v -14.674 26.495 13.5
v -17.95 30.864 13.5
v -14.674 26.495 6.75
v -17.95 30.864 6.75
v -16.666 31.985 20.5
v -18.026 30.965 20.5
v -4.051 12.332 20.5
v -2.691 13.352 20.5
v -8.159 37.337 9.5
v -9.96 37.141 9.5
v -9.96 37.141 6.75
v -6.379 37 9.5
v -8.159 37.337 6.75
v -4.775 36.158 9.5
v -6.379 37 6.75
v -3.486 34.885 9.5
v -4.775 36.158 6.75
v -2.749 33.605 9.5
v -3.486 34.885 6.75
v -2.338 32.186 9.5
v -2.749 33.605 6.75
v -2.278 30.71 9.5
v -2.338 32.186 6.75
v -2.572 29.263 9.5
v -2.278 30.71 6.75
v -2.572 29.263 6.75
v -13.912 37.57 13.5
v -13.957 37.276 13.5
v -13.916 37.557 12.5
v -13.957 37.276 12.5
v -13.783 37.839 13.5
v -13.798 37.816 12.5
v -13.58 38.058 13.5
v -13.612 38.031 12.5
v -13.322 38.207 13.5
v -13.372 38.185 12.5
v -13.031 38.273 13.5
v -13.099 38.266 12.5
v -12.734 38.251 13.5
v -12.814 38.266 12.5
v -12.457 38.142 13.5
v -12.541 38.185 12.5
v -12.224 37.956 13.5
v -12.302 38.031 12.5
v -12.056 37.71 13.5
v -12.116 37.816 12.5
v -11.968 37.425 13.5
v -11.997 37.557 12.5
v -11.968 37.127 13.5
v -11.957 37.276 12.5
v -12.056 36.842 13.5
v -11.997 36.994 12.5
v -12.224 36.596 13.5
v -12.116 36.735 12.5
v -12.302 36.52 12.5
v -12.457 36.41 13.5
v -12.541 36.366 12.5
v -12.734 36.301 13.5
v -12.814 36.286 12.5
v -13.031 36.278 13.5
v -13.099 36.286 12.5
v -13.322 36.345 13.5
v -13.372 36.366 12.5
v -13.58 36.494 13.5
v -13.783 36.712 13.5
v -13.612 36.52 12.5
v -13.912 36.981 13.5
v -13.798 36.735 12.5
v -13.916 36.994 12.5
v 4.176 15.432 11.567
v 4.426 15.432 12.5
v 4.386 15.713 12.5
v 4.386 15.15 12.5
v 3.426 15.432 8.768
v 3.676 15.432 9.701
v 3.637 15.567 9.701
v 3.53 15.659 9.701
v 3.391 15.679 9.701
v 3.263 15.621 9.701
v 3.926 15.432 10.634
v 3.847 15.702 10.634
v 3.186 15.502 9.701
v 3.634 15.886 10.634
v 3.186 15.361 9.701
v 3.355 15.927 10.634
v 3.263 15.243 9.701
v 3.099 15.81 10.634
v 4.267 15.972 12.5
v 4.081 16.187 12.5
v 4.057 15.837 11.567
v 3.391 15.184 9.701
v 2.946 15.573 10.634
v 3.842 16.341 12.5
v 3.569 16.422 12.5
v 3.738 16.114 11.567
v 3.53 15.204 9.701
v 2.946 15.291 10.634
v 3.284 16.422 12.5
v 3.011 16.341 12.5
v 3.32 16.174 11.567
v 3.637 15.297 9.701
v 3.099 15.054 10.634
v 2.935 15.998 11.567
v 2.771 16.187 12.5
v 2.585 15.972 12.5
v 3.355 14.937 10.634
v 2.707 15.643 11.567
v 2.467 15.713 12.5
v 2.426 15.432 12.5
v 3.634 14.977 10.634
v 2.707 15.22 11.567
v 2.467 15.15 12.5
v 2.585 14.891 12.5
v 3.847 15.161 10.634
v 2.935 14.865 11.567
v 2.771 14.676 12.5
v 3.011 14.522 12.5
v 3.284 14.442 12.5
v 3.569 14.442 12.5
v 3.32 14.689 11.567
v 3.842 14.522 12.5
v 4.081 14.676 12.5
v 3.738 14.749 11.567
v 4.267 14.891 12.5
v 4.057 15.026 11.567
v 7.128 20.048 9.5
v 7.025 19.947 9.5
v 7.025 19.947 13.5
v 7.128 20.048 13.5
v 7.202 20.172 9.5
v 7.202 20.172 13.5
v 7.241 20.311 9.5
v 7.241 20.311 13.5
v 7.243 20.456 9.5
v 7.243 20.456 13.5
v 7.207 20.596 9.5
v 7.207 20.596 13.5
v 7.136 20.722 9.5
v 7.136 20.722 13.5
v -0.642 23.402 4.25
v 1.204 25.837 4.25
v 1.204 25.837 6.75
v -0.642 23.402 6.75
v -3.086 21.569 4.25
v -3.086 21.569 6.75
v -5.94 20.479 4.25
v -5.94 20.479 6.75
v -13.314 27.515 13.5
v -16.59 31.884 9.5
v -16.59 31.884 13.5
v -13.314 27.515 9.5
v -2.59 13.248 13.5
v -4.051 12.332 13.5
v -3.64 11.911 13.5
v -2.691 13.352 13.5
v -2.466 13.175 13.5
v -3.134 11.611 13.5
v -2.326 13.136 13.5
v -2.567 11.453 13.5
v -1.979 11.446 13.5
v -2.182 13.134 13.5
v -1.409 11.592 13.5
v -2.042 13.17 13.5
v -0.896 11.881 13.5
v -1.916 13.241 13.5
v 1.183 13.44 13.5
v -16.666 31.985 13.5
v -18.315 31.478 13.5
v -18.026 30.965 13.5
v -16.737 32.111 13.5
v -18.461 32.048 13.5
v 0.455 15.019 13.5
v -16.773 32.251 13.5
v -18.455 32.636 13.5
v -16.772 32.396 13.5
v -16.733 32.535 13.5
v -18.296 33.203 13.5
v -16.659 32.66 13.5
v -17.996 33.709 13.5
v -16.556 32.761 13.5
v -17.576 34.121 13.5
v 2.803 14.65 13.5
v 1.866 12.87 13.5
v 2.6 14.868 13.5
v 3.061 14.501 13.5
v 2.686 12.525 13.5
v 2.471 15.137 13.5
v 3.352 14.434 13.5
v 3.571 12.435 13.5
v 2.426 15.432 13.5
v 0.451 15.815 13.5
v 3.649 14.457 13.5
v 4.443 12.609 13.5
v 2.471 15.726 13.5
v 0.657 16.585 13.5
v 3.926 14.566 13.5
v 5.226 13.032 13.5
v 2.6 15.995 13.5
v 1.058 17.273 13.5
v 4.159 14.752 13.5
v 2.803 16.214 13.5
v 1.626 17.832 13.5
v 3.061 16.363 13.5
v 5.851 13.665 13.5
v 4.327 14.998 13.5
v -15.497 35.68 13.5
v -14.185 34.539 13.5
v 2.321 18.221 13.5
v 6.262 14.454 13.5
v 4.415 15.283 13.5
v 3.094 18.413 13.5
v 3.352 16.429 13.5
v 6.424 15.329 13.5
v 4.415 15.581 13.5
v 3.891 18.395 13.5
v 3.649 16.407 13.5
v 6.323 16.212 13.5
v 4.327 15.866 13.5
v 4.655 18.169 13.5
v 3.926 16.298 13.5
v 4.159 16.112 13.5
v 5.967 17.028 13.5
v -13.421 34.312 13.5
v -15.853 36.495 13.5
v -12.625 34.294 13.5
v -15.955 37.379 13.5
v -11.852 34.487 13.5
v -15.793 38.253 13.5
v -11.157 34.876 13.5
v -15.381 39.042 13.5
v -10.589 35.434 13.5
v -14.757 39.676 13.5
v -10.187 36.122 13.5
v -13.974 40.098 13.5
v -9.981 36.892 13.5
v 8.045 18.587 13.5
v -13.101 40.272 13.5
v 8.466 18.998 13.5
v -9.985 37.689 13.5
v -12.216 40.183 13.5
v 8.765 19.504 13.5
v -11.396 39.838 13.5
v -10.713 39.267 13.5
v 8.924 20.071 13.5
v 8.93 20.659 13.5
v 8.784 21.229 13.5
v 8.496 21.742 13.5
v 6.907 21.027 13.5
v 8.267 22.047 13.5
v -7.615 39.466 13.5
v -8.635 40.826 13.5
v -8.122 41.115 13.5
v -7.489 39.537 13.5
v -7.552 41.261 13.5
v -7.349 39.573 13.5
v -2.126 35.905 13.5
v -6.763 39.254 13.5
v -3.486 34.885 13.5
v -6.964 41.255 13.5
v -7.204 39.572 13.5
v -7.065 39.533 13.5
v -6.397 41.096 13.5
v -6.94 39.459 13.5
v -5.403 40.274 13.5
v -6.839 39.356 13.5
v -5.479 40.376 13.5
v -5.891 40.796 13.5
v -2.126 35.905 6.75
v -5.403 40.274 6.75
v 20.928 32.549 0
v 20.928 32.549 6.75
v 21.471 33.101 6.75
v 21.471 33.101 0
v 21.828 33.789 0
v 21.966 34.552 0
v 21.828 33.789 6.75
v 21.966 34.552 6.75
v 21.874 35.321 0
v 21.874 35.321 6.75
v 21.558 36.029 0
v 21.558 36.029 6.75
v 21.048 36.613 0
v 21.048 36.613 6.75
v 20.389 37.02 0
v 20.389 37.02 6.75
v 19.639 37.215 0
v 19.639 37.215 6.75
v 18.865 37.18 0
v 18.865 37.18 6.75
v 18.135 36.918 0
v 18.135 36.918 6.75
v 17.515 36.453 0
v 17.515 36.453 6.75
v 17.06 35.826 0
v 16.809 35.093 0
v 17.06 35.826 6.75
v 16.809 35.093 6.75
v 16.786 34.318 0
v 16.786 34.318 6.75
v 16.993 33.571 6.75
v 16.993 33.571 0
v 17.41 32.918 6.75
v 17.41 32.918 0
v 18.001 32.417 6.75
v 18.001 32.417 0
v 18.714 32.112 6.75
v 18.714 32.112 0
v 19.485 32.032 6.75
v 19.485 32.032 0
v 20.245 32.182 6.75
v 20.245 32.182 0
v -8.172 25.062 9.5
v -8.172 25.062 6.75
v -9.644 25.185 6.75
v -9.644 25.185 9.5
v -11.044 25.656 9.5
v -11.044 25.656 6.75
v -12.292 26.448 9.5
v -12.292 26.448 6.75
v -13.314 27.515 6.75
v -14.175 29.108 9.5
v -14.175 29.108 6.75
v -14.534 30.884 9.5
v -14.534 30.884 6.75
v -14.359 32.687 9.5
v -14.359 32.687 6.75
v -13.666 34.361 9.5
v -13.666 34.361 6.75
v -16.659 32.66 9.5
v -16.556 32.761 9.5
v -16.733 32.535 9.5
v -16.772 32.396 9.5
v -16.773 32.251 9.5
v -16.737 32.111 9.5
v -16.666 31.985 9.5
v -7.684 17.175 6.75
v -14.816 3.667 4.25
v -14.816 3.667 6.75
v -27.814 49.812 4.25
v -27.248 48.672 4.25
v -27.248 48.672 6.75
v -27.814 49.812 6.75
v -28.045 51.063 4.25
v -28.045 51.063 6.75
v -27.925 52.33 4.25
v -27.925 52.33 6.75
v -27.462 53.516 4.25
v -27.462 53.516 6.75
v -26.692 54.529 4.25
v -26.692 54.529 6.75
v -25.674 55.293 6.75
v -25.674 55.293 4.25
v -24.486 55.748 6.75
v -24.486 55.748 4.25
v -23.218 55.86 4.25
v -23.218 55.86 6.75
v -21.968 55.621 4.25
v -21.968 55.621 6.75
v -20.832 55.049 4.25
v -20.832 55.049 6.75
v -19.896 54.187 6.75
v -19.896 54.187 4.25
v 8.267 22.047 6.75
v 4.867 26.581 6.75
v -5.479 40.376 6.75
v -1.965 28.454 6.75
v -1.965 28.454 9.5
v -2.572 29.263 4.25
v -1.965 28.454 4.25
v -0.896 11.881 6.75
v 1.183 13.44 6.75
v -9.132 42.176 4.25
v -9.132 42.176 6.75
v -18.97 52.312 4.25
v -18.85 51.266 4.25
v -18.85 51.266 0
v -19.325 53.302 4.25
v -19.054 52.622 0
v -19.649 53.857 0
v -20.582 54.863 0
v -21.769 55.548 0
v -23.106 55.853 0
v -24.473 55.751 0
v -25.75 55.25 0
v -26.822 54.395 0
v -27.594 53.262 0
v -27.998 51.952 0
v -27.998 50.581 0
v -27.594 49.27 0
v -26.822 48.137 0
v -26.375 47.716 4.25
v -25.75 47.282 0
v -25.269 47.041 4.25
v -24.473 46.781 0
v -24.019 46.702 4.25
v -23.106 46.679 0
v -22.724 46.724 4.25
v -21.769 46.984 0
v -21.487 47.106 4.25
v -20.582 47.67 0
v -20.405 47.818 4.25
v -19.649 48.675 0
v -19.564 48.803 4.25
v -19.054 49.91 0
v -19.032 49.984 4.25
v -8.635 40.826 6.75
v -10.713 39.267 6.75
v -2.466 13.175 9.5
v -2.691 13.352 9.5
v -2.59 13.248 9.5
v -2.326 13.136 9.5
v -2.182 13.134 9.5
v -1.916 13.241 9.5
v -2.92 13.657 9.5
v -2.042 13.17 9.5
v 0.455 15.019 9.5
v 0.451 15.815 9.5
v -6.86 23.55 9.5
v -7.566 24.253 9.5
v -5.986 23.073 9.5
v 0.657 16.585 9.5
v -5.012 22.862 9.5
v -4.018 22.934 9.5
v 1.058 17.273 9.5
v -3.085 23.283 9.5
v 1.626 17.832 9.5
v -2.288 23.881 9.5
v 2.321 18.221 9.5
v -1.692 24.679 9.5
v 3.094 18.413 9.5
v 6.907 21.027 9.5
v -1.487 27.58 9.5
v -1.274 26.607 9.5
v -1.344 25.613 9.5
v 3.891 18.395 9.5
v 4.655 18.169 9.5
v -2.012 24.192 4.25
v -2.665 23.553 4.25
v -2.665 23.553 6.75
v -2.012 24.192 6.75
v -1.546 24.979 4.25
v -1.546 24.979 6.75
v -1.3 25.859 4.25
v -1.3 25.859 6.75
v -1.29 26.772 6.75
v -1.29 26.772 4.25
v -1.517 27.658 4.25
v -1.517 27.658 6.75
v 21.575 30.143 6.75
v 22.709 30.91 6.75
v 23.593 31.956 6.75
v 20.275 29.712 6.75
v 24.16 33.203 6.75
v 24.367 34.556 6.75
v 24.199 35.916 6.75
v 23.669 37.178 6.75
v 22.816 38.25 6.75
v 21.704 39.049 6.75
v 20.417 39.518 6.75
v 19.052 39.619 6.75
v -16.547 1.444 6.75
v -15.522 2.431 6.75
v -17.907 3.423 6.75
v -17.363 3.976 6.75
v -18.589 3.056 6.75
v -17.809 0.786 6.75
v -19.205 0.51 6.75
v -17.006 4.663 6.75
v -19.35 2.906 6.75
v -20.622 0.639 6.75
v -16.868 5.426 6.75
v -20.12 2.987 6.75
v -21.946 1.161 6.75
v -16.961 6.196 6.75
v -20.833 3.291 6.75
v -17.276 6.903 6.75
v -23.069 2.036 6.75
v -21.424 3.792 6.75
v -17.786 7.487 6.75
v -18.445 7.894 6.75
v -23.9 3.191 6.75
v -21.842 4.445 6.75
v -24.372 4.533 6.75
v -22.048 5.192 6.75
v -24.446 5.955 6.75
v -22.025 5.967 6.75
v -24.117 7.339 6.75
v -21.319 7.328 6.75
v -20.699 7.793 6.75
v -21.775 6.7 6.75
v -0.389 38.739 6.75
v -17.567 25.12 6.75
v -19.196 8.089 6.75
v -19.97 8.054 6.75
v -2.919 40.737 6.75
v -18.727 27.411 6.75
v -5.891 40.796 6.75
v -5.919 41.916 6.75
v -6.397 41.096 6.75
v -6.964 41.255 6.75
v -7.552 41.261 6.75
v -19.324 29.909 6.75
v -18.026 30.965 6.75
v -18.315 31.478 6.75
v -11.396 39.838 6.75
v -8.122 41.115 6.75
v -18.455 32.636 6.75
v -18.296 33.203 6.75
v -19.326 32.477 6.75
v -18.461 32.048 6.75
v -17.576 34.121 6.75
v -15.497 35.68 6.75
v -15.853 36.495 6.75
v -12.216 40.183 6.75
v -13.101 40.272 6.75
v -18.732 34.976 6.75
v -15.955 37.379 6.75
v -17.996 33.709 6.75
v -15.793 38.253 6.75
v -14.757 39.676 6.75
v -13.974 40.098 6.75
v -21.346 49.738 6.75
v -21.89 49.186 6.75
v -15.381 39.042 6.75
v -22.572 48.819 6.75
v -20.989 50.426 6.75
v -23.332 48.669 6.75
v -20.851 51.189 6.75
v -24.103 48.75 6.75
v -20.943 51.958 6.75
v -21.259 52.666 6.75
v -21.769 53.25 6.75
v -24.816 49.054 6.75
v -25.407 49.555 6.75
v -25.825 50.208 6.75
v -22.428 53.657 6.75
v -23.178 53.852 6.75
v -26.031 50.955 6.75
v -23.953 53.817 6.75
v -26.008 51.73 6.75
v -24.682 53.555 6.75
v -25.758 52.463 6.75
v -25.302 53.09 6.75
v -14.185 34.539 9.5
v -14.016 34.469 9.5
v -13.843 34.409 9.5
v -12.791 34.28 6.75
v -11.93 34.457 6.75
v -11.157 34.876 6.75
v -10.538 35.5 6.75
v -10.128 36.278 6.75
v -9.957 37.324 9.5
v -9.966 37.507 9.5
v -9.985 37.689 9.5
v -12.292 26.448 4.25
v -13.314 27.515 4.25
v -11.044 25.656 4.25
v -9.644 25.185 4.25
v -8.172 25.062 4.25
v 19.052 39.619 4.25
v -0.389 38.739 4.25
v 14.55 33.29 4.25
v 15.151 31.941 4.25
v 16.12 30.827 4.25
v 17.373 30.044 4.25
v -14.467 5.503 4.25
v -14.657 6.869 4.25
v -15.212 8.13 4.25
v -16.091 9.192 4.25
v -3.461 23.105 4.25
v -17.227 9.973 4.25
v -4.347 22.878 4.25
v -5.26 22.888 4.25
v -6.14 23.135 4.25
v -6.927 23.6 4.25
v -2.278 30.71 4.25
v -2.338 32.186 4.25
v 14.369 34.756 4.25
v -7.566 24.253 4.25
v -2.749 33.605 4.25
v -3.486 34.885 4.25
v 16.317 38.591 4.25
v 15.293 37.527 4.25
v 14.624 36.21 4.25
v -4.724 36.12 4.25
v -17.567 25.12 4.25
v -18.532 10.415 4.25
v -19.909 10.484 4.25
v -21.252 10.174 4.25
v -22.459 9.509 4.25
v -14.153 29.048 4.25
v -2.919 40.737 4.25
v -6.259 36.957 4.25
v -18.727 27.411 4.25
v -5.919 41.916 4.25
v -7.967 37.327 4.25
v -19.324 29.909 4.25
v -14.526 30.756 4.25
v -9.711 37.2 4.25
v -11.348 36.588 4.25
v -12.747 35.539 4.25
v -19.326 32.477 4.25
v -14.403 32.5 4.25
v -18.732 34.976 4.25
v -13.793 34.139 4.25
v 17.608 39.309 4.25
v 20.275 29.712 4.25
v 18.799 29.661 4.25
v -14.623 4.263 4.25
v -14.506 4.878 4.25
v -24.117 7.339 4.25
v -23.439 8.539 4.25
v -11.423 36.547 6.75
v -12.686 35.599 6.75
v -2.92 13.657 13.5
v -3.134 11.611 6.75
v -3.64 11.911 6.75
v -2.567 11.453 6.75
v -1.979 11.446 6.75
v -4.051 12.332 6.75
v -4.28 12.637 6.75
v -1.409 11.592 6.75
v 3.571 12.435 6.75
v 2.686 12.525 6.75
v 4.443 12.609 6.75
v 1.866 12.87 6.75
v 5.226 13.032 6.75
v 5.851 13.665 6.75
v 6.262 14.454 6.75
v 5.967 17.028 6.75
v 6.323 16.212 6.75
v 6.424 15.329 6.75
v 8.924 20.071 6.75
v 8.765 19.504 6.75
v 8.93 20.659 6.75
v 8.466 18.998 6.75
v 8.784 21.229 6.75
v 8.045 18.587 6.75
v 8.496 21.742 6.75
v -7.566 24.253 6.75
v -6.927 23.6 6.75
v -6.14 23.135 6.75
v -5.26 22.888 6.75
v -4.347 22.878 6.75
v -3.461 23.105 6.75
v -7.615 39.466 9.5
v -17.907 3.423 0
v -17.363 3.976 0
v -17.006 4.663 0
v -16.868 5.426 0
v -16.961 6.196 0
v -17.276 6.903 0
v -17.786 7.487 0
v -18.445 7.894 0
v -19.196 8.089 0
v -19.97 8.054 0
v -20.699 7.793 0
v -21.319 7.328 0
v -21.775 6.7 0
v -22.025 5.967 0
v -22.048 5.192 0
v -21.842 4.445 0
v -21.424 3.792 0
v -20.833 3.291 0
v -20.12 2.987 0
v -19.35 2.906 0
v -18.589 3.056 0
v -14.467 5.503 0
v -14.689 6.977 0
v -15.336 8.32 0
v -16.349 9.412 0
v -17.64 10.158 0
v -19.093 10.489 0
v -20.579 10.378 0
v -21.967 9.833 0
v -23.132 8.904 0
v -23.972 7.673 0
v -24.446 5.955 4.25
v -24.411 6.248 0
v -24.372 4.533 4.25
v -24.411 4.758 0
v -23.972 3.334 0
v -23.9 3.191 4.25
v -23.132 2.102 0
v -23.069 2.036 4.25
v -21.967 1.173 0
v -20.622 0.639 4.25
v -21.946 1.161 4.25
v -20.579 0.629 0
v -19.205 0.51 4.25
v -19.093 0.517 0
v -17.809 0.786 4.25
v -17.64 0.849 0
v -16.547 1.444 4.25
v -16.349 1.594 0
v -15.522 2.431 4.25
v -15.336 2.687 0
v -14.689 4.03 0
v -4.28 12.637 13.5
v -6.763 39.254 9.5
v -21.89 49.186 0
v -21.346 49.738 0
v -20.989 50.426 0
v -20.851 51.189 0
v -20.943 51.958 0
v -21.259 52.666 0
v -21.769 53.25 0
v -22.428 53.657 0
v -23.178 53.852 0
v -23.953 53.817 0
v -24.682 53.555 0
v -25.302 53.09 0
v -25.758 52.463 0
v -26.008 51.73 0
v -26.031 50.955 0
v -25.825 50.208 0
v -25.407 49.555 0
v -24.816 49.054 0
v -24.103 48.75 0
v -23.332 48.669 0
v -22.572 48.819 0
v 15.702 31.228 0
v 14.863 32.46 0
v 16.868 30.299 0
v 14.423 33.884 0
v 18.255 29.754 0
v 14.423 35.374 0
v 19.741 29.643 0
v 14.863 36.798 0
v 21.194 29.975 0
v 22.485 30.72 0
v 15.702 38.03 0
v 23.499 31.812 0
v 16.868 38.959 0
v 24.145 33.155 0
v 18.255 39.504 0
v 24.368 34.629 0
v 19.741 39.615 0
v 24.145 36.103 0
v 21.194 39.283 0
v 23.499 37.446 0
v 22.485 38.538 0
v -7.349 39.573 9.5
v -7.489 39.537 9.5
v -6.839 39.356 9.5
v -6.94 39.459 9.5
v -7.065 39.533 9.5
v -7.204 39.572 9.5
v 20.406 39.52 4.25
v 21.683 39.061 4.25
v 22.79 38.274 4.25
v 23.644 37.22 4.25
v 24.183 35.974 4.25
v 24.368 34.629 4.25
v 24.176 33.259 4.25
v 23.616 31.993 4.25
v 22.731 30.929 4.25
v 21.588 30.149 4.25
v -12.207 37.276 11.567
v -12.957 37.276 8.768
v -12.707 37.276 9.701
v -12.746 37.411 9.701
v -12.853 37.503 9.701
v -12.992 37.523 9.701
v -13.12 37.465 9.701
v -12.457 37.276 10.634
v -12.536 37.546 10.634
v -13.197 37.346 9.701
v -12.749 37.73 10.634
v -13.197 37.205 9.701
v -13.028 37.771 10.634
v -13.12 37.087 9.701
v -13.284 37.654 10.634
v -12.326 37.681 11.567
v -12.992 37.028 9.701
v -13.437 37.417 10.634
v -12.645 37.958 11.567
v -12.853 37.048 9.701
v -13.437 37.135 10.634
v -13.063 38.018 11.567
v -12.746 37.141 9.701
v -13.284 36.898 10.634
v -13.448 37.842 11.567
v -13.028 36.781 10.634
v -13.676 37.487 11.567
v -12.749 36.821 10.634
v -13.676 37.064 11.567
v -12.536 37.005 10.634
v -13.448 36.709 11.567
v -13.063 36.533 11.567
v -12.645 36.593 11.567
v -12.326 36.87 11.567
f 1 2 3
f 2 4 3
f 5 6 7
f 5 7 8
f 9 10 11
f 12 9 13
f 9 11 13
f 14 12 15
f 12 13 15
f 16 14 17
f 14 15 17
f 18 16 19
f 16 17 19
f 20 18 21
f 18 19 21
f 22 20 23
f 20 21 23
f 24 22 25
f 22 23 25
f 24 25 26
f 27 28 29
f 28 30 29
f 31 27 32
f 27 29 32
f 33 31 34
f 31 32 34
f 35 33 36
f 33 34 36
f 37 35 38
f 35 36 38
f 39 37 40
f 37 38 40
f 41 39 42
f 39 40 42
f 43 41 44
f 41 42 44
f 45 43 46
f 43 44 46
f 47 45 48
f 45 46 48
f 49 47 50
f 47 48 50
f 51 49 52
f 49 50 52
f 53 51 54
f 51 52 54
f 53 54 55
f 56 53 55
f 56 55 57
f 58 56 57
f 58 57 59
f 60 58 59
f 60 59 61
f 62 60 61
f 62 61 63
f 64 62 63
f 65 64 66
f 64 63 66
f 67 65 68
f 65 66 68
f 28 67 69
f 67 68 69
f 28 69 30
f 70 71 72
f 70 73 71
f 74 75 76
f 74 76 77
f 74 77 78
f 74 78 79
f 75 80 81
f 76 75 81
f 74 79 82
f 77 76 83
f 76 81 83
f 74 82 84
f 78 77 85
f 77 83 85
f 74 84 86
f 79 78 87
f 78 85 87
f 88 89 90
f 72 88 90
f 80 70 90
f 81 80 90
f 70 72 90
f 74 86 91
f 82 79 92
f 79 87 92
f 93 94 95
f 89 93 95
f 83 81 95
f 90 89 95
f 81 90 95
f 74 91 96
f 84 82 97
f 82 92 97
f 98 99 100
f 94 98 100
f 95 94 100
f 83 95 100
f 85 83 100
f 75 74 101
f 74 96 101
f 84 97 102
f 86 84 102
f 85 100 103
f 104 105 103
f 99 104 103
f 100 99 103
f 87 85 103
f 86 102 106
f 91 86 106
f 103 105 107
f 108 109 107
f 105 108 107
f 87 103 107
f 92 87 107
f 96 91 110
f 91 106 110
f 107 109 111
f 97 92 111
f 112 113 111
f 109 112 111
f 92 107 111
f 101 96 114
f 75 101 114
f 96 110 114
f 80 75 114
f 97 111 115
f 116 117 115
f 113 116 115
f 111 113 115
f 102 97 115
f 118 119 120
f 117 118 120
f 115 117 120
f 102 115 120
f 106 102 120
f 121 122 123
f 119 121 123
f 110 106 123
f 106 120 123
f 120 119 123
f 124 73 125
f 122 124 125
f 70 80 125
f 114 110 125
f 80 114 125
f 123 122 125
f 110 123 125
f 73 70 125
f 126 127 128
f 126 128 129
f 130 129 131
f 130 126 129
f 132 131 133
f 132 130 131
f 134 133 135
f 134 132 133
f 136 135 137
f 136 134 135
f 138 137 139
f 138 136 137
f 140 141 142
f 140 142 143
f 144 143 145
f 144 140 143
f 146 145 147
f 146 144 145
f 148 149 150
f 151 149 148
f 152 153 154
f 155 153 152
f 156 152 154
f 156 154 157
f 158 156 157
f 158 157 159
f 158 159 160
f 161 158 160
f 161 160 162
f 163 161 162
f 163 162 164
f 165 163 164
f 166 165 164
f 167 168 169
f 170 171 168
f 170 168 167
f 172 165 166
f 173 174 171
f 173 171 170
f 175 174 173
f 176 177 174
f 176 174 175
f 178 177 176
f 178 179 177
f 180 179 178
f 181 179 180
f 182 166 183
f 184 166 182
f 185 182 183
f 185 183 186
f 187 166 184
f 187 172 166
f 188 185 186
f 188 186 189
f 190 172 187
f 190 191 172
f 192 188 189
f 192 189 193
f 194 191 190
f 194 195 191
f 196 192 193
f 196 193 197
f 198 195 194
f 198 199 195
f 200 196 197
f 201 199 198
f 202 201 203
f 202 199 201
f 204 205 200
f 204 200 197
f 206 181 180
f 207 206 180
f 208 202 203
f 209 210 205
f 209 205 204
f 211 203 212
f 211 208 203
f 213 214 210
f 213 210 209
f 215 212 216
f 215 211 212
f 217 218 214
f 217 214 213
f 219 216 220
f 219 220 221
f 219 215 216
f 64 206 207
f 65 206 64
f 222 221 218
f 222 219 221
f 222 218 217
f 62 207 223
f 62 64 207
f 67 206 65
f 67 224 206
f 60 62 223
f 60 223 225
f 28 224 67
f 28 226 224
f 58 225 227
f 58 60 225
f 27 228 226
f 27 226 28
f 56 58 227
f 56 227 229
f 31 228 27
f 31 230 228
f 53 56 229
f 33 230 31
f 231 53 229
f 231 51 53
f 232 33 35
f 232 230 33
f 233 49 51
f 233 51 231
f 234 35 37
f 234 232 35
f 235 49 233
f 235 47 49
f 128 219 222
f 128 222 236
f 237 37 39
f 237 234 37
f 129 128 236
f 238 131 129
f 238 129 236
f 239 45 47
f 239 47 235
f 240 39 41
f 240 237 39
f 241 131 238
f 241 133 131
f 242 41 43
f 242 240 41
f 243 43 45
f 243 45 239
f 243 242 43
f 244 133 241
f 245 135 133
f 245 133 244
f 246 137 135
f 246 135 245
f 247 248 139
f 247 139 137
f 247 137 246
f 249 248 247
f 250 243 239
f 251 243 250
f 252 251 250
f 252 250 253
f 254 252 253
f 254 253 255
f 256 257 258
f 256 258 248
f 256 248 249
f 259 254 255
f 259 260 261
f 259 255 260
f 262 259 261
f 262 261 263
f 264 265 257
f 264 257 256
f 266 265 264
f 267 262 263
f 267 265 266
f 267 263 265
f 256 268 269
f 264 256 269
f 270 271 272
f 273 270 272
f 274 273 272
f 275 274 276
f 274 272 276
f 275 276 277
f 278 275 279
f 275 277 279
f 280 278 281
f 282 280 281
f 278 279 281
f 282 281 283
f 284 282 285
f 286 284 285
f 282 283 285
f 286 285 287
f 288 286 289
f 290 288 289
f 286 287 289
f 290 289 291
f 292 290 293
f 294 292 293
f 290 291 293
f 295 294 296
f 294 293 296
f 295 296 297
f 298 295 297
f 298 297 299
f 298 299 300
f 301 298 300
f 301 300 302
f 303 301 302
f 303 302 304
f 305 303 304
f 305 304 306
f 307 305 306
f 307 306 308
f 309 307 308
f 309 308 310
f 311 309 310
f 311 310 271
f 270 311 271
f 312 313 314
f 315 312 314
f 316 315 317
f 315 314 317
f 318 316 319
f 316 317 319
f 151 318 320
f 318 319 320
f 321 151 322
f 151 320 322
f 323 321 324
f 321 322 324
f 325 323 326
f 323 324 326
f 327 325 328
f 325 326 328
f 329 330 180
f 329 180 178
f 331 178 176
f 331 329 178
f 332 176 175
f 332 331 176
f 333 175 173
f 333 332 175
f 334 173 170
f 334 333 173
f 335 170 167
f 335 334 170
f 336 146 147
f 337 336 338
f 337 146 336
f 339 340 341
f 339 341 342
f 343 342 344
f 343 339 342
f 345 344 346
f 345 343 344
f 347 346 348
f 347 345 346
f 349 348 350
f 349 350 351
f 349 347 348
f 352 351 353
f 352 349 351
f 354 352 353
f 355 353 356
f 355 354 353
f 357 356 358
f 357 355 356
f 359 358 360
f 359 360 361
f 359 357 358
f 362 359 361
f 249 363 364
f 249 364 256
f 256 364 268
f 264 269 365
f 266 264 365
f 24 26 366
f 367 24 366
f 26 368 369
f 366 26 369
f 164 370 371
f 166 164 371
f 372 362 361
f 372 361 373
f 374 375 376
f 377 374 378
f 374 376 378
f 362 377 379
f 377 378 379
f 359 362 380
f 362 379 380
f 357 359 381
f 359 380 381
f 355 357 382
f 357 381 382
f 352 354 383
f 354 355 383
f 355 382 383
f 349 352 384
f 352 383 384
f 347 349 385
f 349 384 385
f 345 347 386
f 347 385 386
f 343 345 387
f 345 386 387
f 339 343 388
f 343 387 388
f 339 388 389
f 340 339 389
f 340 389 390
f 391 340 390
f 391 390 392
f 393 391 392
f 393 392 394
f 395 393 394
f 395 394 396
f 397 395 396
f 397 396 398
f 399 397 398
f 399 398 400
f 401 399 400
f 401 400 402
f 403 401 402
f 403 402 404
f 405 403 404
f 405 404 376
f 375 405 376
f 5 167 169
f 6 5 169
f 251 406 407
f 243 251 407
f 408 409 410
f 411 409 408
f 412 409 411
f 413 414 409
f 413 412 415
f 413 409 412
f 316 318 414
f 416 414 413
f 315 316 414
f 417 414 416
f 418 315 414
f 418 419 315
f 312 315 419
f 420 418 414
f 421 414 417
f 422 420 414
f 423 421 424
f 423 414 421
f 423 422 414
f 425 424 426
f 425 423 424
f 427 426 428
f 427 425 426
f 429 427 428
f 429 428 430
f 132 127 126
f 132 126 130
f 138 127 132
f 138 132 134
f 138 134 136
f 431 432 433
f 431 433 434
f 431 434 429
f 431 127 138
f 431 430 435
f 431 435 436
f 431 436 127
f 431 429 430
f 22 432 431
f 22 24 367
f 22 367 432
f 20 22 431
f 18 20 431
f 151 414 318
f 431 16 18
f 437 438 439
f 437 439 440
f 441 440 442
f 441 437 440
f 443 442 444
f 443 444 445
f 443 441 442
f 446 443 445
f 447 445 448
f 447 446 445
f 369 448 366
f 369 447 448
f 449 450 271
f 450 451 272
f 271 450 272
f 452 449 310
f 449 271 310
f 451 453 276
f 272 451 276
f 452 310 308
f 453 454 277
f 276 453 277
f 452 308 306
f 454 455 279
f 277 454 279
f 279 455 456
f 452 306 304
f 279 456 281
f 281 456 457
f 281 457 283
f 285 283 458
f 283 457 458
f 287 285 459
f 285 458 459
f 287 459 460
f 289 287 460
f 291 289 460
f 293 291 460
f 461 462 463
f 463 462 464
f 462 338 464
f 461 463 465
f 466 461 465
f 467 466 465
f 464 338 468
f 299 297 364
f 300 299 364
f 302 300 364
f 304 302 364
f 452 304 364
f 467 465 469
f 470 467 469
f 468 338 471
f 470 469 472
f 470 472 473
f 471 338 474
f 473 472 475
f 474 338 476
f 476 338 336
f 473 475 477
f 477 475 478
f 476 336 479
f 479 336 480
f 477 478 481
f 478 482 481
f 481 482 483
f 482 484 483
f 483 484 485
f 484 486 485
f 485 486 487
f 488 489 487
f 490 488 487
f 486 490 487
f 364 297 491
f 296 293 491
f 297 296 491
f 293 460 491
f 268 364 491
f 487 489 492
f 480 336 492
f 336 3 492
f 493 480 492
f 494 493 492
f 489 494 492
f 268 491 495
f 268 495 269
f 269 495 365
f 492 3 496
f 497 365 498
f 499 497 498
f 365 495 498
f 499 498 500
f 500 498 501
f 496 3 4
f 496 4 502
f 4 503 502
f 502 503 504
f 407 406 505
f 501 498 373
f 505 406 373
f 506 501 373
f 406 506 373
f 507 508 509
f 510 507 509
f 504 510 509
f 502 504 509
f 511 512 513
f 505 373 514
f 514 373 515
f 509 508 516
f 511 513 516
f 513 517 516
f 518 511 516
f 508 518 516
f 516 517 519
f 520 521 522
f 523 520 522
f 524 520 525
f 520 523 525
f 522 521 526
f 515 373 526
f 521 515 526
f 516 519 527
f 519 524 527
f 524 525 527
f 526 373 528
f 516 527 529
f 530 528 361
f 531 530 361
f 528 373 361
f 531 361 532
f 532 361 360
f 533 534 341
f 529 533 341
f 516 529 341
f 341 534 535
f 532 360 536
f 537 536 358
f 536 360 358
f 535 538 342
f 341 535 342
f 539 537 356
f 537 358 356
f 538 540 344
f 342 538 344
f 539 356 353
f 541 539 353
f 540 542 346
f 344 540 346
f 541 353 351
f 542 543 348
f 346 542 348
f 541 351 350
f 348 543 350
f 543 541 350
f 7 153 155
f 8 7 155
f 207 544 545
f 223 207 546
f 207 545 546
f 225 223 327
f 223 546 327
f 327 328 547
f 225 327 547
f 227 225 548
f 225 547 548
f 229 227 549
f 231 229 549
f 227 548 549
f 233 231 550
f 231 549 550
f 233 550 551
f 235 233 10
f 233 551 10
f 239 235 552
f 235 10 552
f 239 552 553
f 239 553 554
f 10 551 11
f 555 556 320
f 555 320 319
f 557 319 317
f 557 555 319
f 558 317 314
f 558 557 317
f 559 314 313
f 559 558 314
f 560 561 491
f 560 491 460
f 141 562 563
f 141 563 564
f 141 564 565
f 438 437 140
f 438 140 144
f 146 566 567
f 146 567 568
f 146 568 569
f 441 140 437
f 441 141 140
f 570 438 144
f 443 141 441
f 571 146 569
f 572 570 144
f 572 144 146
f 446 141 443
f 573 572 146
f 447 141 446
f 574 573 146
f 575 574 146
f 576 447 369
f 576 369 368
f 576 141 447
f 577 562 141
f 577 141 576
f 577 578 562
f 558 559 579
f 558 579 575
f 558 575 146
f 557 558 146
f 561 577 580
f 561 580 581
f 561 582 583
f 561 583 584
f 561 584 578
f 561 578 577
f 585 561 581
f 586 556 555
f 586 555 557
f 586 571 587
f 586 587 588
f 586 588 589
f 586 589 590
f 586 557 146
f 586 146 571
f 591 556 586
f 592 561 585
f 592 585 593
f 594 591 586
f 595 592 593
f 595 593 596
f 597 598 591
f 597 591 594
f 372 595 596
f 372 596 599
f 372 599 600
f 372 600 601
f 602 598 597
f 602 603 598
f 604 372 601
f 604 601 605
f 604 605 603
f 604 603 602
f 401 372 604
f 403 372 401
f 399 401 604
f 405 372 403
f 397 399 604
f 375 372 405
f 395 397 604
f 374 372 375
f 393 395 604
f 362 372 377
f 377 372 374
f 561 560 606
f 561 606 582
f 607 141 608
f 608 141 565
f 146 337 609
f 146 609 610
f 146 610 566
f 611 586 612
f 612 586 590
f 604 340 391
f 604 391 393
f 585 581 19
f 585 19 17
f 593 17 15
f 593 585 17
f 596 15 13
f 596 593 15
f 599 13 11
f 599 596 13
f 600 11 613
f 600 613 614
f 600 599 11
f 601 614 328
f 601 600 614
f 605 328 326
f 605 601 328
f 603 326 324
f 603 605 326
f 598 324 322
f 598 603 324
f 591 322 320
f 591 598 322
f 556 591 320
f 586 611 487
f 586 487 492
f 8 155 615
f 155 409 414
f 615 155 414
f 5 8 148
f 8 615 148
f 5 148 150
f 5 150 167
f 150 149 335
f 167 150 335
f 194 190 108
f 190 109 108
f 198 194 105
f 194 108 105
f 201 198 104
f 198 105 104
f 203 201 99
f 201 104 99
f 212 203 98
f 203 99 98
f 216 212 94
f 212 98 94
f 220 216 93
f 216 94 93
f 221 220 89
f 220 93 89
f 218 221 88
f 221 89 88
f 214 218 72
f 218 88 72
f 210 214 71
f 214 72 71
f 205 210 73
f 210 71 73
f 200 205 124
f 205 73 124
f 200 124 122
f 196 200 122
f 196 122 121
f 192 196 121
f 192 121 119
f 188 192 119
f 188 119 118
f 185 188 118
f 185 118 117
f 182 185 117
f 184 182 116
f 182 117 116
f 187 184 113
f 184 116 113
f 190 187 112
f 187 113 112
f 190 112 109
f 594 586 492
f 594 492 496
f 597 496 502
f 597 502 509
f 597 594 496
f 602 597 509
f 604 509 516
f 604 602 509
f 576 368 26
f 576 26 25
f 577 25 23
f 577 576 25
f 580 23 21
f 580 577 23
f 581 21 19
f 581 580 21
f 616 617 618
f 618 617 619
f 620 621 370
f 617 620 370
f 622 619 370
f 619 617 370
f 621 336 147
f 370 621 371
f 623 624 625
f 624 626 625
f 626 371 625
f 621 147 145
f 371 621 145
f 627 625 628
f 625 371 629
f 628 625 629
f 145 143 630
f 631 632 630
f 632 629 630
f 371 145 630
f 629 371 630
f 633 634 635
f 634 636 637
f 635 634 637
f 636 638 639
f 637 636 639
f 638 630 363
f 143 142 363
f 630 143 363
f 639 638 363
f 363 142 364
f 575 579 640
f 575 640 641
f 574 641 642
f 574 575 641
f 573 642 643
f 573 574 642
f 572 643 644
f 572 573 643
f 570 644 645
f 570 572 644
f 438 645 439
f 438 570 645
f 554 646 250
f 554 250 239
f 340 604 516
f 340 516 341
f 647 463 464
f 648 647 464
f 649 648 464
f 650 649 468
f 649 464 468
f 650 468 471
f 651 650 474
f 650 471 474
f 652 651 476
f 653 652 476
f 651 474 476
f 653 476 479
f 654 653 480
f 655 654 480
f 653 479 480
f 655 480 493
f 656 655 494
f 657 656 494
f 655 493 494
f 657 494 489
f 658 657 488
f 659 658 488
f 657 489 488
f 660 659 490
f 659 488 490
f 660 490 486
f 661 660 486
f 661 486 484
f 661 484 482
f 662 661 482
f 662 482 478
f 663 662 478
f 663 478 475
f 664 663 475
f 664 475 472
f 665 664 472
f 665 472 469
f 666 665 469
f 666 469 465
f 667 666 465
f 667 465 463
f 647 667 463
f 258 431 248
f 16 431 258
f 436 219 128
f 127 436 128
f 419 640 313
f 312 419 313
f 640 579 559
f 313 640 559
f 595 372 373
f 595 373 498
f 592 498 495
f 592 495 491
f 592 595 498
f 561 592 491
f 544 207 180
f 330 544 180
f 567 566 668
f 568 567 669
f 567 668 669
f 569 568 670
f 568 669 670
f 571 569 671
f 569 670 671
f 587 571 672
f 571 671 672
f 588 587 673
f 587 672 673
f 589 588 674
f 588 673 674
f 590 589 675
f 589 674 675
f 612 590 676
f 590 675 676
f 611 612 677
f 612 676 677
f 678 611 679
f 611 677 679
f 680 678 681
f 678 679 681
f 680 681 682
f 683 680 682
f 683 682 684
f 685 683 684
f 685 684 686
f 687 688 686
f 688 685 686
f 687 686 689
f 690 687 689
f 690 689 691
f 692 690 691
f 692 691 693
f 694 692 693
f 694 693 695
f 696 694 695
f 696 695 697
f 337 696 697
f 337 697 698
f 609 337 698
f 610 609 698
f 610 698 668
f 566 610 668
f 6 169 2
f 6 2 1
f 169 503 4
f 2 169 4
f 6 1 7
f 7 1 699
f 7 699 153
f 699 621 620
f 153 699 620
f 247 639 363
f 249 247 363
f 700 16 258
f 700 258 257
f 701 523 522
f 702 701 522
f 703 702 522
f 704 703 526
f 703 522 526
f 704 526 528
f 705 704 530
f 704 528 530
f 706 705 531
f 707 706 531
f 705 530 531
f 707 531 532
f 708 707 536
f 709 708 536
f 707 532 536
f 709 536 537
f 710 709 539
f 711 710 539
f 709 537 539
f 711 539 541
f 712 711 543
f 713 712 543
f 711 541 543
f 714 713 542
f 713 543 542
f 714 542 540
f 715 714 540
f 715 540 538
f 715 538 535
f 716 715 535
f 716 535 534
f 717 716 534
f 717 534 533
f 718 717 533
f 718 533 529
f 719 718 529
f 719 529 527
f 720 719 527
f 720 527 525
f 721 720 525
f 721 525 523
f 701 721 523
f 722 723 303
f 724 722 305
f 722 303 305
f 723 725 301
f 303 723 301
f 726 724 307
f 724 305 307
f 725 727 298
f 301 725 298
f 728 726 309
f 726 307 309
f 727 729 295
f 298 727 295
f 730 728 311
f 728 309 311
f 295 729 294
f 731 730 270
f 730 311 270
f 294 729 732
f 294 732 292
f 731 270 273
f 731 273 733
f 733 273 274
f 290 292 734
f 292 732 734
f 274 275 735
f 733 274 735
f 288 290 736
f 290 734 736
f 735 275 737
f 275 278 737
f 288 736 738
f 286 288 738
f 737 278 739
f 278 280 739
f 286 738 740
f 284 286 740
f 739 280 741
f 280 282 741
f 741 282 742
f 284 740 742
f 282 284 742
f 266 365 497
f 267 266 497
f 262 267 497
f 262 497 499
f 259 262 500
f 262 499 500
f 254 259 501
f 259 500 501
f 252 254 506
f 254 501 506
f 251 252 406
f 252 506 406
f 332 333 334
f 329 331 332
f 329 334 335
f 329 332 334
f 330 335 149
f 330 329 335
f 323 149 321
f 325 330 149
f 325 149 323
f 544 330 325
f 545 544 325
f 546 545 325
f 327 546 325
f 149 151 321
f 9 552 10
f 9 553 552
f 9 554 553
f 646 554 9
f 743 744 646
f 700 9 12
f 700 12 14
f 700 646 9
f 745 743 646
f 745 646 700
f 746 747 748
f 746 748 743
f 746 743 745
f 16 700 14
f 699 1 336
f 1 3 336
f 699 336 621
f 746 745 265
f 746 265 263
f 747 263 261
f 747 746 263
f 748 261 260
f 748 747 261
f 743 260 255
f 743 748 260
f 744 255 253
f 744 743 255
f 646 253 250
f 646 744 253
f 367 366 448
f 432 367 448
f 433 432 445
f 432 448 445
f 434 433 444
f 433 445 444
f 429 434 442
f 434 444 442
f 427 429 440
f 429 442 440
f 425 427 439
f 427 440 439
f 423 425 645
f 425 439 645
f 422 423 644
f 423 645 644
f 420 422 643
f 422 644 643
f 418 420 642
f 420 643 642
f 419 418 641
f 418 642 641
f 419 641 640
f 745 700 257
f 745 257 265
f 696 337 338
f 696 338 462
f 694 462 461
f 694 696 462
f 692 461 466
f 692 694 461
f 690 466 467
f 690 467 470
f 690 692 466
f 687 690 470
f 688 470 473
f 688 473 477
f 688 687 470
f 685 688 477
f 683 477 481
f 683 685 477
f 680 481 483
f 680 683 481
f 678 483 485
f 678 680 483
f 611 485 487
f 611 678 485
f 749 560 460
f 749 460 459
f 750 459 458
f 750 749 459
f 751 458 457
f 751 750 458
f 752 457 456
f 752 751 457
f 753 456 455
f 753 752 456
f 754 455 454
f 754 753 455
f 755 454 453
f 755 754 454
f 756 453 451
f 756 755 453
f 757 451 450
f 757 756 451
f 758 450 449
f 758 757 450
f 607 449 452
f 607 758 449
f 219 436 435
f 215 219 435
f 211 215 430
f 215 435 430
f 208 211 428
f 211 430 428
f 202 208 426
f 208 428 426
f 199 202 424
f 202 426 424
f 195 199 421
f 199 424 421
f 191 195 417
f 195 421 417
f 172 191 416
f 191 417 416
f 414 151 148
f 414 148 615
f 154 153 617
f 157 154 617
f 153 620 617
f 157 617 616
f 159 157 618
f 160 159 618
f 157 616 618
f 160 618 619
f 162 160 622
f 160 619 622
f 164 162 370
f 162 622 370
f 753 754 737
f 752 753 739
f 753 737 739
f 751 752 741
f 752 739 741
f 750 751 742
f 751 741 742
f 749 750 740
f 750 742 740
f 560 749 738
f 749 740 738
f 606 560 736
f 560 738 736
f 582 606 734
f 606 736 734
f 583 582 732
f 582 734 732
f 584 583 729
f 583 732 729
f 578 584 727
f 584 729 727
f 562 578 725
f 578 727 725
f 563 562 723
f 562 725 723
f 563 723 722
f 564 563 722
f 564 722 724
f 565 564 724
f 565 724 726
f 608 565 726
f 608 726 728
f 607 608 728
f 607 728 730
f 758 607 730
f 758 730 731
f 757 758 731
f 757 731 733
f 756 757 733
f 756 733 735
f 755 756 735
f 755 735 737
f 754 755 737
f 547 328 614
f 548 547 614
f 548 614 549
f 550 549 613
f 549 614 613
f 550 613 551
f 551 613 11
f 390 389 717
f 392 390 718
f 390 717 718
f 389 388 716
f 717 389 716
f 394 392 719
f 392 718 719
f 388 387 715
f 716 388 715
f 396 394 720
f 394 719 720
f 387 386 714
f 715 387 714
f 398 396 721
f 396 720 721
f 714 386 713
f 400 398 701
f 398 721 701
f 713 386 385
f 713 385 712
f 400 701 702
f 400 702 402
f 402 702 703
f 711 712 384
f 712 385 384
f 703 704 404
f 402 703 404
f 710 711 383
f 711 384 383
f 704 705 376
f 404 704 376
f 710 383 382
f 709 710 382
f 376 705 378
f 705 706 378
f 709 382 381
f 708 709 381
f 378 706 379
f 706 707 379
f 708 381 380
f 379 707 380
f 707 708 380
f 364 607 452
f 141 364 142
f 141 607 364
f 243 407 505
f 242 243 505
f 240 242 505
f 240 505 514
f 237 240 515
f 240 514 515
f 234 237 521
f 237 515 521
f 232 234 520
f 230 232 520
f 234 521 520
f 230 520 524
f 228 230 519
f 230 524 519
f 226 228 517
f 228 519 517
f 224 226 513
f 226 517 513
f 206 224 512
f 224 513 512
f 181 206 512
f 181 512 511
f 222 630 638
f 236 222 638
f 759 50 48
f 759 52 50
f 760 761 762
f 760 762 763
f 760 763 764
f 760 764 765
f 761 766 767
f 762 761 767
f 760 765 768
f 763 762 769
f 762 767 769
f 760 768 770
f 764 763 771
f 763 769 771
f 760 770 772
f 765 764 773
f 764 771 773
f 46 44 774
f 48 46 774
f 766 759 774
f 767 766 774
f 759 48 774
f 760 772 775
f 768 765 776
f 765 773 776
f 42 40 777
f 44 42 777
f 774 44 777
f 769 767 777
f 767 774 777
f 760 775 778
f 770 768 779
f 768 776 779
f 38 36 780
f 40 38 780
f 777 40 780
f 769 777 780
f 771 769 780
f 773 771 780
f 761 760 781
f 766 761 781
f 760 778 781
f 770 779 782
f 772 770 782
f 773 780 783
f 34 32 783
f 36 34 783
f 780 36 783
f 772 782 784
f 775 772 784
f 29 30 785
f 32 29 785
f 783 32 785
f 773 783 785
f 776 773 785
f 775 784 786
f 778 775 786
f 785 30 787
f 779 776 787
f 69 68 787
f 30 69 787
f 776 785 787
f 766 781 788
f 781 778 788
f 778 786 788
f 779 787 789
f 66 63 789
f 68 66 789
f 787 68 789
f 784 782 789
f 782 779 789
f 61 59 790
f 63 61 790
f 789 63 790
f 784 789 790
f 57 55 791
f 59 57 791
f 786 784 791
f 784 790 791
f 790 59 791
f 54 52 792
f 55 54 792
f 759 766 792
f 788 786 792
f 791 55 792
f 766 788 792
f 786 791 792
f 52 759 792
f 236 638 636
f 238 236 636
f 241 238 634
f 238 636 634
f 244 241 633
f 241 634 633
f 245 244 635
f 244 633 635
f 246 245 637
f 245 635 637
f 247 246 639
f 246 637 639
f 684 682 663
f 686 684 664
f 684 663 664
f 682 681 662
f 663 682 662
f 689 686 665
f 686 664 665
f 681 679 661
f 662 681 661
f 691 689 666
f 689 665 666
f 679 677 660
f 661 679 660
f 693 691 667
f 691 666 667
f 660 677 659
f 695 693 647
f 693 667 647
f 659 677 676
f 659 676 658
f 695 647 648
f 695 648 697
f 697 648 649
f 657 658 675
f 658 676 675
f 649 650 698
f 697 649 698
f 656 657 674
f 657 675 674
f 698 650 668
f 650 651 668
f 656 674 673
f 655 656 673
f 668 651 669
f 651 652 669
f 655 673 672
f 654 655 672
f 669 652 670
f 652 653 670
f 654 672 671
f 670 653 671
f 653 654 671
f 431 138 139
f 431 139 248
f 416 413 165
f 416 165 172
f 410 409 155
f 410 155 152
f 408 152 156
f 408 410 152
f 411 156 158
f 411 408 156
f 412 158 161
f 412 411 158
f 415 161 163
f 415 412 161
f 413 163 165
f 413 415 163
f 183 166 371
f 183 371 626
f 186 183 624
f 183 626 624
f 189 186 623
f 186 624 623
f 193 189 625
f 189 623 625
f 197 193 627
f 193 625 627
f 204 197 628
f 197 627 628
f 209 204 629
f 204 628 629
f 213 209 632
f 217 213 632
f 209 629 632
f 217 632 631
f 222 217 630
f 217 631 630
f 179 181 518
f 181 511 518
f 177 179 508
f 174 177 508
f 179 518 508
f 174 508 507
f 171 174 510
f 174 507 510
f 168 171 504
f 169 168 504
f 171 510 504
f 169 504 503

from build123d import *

# Parameters (mm, degrees)
SKETCH1_R                      = 5
BOSS_EXTRUDE1_DEPTH            = 4.25
BOSS_EXTRUDE1_2_DEPTH          = 4.25
SKETCH1_R_2                    = 4.6
BOSS_EXTRUDE1_3_DEPTH          = 4.25
BOSS_EXTRUDE2_DEPTH            = 2.5
BOSS_EXTRUDE3_DEPTH            = 2.75
BOSS_EXTRUDE4_DEPTH            = 4
BOSS_EXTRUDE5_START            = -6.75
SKETCH7_R                      = 3
BOSS_EXTRUDE5_DEPTH            = 6.75
BOSS_EXTRUDE6_DEPTH            = 7
F_2_0_2_DIAMETER_HOLE1_D       = 2
F_2_0_2_DIAMETER_HOLE1_DEPTH   = 1
F_2_0_2_DIAMETER_HOLE1_TIP     = 3.732050808
F_5_2_5_2_DIAMETER_HOLE1_D     = 5.2
F_5_2_5_2_DIAMETER_HOLE1_DEPTH = 41
F_5_2_5_2_DIAMETER_HOLE1_TIP   = 1.562237609


with BuildPart() as part:
    # Sketch1 → Boss-Extrude1 (new body)
    with BuildSketch(Plane.XY):
        with Locations((19.367534606, 34.628988105)):
            Circle(SKETCH1_R)
    extrude(amount=BOSS_EXTRUDE1_DEPTH)



with BuildPart() as body_2:
    # Sketch1 → Boss-Extrude1 2 (new body)
    with BuildSketch(Plane.XY):
        with Locations((-19.466738271, 5.503283448)):
            Circle(SKETCH1_R)
    extrude(amount=BOSS_EXTRUDE1_2_DEPTH)


with BuildPart() as body_3:
    # Sketch1 → Boss-Extrude1 3 (new body)
    with BuildSketch(Plane.XY):
        with Locations((-23.449601832, 51.266135777)):
            Circle(SKETCH1_R_2)
    extrude(amount=BOSS_EXTRUDE1_3_DEPTH)


with BuildPart() as part_1:
    add(part.part)

    add(body_2.part)  # Boss-Extrude2 merges body 2

    add(body_3.part)  # Boss-Extrude2 merges body 3
    # Sketch3 → Boss-Extrude2 (add)
    with BuildSketch(Plane.XY.offset(4.25)):
        with BuildLine():
            Line((-19.895572194, 54.186559261), (-9.131726679, 42.175635572))
            ThreePointArc((-9.131726679, 42.175635572), (-4.375228584, 41.437246463), (-0.389407444, 38.738594493))
            Line((-0.389407444, 38.738594493), (19.051801444, 39.619009405))
            ThreePointArc((19.051801444, 39.619009405), (24.329841267, 35.241778932), (20.275201283, 29.712064148))
            Line((20.275201283, 29.712064148), (1.203848705, 25.836597173))
            ThreePointArc((1.203848705, 25.836597173), (-1.800000005, 22.400000007), (-5.940210923, 20.478552452))
            Line((-5.940210923, 20.478552452), (-14.816024112, 3.667293848))
            ThreePointArc((-14.816024112, 3.667293848), (-21.302727871, 0.852569289), (-24.11745243, 7.339273048))
            Line((-24.11745243, 7.339273048), (-17.566802713, 25.119726319))
            ThreePointArc((-17.566802713, 25.119726319), (-19.323959856, 29.908837282), (-18.731726679, 34.975635572))
            Line((-18.731726679, 34.975635572), (-27.248336676, 48.671985899))
            ThreePointArc((-27.248336676, 48.671985899), (-26.209601832, 54.946135777), (-19.895572194, 54.186559261))
        make_face()
        with BuildLine():
            Line((-8.172170243, 25.06222699), (-7.565580005, 24.253440007))
            ThreePointArc((-7.565580005, 24.253440007), (-5.26029132, 22.888460799), (-2.665020005, 23.553360007))
            ThreePointArc((-2.665020005, 23.553360007), (-1.300040797, 25.858648691), (-1.964940005, 28.453920007))
            Line((-1.964940005, 28.453920007), (-2.571530243, 29.26270699))
            ThreePointArc((-2.571530243, 29.26270699), (-2.337729587, 32.186428603), (-3.486400005, 34.885200007))
            ThreePointArc((-3.486400005, 34.885200007), (-12.085200005, 36.113600007), (-13.313600005, 27.514800007))
            ThreePointArc((-13.313600005, 27.514800007), (-11.044407175, 25.656420412), (-8.172170243, 25.06222699))
        make_face(mode=Mode.SUBTRACT)
    extrude(amount=BOSS_EXTRUDE2_DEPTH)

    # Sketch5 → Boss-Extrude3 (add)
    with BuildSketch(Plane.XY.offset(6.75)):
        with BuildLine():
            Line((8.495879995, 21.742160007), (8.267279995, 22.046960007))
            Line((8.267279995, 22.046960007), (-2.126400462, 35.905200616))
            Line((-2.126400462, 35.905200616), (-5.403000005, 40.274000007))
            Line((-5.403000005, 40.274000007), (-5.479200005, 40.375600007))
            ThreePointArc((-5.479200005, 40.375600007), (-6.963636268, 41.254546165), (-8.634800005, 40.826400007))
            Line((-8.634800005, 40.826400007), (-13.105200005, 37.473600007))
            Line((-13.105200005, 37.473600007), (-17.575600005, 34.120800007))
            ThreePointArc((-17.575600005, 34.120800007), (-18.454546164, 32.636363744), (-18.026400005, 30.965200007))
            Line((-18.026400005, 30.965200007), (-17.950200005, 30.863600007))
            Line((-17.950200005, 30.863600007), (-14.673600388, 26.494800517))
            Line((-14.673600388, 26.494800517), (-4.279920005, 12.636560007))
            Line((-4.279920005, 12.636560007), (-4.051320005, 12.331760007))
            ThreePointArc((-4.051320005, 12.331760007), (-2.566883742, 11.452813848), (-0.895720005, 11.880960007))
            Line((-0.895720005, 11.880960007), (8.045079995, 18.586560007))
            ThreePointArc((8.045079995, 18.586560007), (8.924026154, 20.07099627), (8.495879995, 21.742160007))
        make_face()
        with BuildLine():
            Line((-7.565580005, 24.253440007), (-8.172170243, 25.06222699))
            ThreePointArc((-8.172170243, 25.06222699), (-12.085200005, 36.113600007), (-2.571530243, 29.26270699))
            Line((-2.571530243, 29.26270699), (-1.964940005, 28.453920007))
            ThreePointArc((-1.964940005, 28.453920007), (-2.665020005, 23.553360007), (-7.565580005, 24.253440007))
        make_face(mode=Mode.SUBTRACT)
    extrude(amount=BOSS_EXTRUDE3_DEPTH)

    # Sketch6 → Boss-Extrude4 (add)
    with BuildSketch(Plane.XY.offset(9.5)):
        with BuildLine():
            Line((-8.634800005, 40.826400007), (-13.105200005, 37.473600007))
            Line((-13.105200005, 37.473600007), (-17.575600005, 34.120800007))
            ThreePointArc((-17.575600005, 34.120800007), (-18.454546164, 32.636363744), (-18.026400005, 30.965200007))
            Line((-18.026400005, 30.965200007), (-17.950200005, 30.863600007))
            Line((-17.950200005, 30.863600007), (-14.673600388, 26.494800517))
            Line((-14.673600388, 26.494800517), (-4.279920005, 12.636560007))
            Line((-4.279920005, 12.636560007), (-4.051320005, 12.331760007))
            ThreePointArc((-4.051320005, 12.331760007), (-2.566883742, 11.452813848), (-0.895720005, 11.880960007))
            Line((-0.895720005, 11.880960007), (8.045079995, 18.586560007))
            ThreePointArc((8.045079995, 18.586560007), (8.924026154, 20.07099627), (8.495879995, 21.742160007))
            Line((8.495879995, 21.742160007), (8.267279995, 22.046960007))
            Line((8.267279995, 22.046960007), (-2.126400462, 35.905200616))
            Line((-2.126400462, 35.905200616), (-5.403000005, 40.274000007))
            Line((-5.403000005, 40.274000007), (-5.479200005, 40.375600007))
            ThreePointArc((-5.479200005, 40.375600007), (-6.963636268, 41.254546165), (-8.634800005, 40.826400007))
        make_face()
        with BuildLine():
            Line((6.907279995, 21.026960007), (-3.486400462, 34.885200616))
            Line((-3.486400462, 34.885200616), (-6.763000005, 39.254000007))
            Line((-6.763000005, 39.254000007), (-6.839200005, 39.355600007))
            ThreePointArc((-6.839200005, 39.355600007), (-7.204052574, 39.571632026), (-7.614800005, 39.466400007))
            Line((-7.614800005, 39.466400007), (-12.085200005, 36.113600007))
            Line((-12.085200005, 36.113600007), (-16.555600005, 32.760800007))
            ThreePointArc((-16.555600005, 32.760800007), (-16.771632024, 32.395947438), (-16.666400005, 31.985200007))
            Line((-16.666400005, 31.985200007), (-16.590200005, 31.883600007))
            Line((-16.590200005, 31.883600007), (-13.313600388, 27.514800517))
            Line((-13.313600388, 27.514800517), (-2.919920005, 13.656560007))
            Line((-2.919920005, 13.656560007), (-2.691320005, 13.351760007))
            ThreePointArc((-2.691320005, 13.351760007), (-2.326467436, 13.135727987), (-1.915720005, 13.240960007))
            Line((-1.915720005, 13.240960007), (7.025079995, 19.946560007))
            ThreePointArc((7.025079995, 19.946560007), (7.241112015, 20.311412575), (7.135879995, 20.722160007))
            Line((7.135879995, 20.722160007), (6.907279995, 21.026960007))
        make_face(mode=Mode.SUBTRACT)
    extrude(amount=BOSS_EXTRUDE4_DEPTH)

    # Sketch7 → Boss-Extrude5 (add)
    with BuildSketch(Plane.XY.offset(13.5).offset(BOSS_EXTRUDE5_START)):
        with Locations((-12.956760005, 37.275680007)):
            Circle(SKETCH7_R)
        with Locations((3.426239995, 15.431680007)):
            Circle(SKETCH7_R)
    extrude(amount=BOSS_EXTRUDE5_DEPTH)

    # Sketch8 → Boss-Extrude6 (add)
    with BuildSketch(Plane.XY.offset(13.5)):
        Polygon((-16.666400005, 31.985200007), (-18.026400005, 30.965200007), (-4.051320005, 12.331760007), (-2.691320005, 13.351760007), align=None)
    extrude(amount=BOSS_EXTRUDE6_DEPTH)

    # Ø2.0 (2) Diameter Hole1
    with Locations(Plane.XY.offset(13.5)):
        with Locations((-12.956760005, 37.275680007), (3.426239995, 15.431680007)):
            Hole(F_2_0_2_DIAMETER_HOLE1_D / 2, depth=F_2_0_2_DIAMETER_HOLE1_DEPTH)
            with Locations((0, 0, -(F_2_0_2_DIAMETER_HOLE1_DEPTH + F_2_0_2_DIAMETER_HOLE1_TIP / 2))):  # 30° drill point
                Cone(0, F_2_0_2_DIAMETER_HOLE1_D / 2, F_2_0_2_DIAMETER_HOLE1_TIP, mode=Mode.SUBTRACT)

    # Ø5.2 (5.2) Diameter Hole1
    with Locations(Plane(origin=(-108.726431202, 76.790635104, -28), x_dir=(-0.6000000000000003, 0.7999999999999998, 4.198929075555247e-15), z_dir=(0, 0, -1))):
        with Locations((-110.585697084, 28.635343351), (-71.585697084, 52.906763899), (-110.585697084, 77.178184447)):
            Hole(F_5_2_5_2_DIAMETER_HOLE1_D / 2, depth=F_5_2_5_2_DIAMETER_HOLE1_DEPTH)
            with Locations((0, 0, -(F_5_2_5_2_DIAMETER_HOLE1_DEPTH + F_5_2_5_2_DIAMETER_HOLE1_TIP / 2))):  # 118° drill point
                Cone(0, F_5_2_5_2_DIAMETER_HOLE1_D / 2, F_5_2_5_2_DIAMETER_HOLE1_TIP, mode=Mode.SUBTRACT)


solid = part_1.part
